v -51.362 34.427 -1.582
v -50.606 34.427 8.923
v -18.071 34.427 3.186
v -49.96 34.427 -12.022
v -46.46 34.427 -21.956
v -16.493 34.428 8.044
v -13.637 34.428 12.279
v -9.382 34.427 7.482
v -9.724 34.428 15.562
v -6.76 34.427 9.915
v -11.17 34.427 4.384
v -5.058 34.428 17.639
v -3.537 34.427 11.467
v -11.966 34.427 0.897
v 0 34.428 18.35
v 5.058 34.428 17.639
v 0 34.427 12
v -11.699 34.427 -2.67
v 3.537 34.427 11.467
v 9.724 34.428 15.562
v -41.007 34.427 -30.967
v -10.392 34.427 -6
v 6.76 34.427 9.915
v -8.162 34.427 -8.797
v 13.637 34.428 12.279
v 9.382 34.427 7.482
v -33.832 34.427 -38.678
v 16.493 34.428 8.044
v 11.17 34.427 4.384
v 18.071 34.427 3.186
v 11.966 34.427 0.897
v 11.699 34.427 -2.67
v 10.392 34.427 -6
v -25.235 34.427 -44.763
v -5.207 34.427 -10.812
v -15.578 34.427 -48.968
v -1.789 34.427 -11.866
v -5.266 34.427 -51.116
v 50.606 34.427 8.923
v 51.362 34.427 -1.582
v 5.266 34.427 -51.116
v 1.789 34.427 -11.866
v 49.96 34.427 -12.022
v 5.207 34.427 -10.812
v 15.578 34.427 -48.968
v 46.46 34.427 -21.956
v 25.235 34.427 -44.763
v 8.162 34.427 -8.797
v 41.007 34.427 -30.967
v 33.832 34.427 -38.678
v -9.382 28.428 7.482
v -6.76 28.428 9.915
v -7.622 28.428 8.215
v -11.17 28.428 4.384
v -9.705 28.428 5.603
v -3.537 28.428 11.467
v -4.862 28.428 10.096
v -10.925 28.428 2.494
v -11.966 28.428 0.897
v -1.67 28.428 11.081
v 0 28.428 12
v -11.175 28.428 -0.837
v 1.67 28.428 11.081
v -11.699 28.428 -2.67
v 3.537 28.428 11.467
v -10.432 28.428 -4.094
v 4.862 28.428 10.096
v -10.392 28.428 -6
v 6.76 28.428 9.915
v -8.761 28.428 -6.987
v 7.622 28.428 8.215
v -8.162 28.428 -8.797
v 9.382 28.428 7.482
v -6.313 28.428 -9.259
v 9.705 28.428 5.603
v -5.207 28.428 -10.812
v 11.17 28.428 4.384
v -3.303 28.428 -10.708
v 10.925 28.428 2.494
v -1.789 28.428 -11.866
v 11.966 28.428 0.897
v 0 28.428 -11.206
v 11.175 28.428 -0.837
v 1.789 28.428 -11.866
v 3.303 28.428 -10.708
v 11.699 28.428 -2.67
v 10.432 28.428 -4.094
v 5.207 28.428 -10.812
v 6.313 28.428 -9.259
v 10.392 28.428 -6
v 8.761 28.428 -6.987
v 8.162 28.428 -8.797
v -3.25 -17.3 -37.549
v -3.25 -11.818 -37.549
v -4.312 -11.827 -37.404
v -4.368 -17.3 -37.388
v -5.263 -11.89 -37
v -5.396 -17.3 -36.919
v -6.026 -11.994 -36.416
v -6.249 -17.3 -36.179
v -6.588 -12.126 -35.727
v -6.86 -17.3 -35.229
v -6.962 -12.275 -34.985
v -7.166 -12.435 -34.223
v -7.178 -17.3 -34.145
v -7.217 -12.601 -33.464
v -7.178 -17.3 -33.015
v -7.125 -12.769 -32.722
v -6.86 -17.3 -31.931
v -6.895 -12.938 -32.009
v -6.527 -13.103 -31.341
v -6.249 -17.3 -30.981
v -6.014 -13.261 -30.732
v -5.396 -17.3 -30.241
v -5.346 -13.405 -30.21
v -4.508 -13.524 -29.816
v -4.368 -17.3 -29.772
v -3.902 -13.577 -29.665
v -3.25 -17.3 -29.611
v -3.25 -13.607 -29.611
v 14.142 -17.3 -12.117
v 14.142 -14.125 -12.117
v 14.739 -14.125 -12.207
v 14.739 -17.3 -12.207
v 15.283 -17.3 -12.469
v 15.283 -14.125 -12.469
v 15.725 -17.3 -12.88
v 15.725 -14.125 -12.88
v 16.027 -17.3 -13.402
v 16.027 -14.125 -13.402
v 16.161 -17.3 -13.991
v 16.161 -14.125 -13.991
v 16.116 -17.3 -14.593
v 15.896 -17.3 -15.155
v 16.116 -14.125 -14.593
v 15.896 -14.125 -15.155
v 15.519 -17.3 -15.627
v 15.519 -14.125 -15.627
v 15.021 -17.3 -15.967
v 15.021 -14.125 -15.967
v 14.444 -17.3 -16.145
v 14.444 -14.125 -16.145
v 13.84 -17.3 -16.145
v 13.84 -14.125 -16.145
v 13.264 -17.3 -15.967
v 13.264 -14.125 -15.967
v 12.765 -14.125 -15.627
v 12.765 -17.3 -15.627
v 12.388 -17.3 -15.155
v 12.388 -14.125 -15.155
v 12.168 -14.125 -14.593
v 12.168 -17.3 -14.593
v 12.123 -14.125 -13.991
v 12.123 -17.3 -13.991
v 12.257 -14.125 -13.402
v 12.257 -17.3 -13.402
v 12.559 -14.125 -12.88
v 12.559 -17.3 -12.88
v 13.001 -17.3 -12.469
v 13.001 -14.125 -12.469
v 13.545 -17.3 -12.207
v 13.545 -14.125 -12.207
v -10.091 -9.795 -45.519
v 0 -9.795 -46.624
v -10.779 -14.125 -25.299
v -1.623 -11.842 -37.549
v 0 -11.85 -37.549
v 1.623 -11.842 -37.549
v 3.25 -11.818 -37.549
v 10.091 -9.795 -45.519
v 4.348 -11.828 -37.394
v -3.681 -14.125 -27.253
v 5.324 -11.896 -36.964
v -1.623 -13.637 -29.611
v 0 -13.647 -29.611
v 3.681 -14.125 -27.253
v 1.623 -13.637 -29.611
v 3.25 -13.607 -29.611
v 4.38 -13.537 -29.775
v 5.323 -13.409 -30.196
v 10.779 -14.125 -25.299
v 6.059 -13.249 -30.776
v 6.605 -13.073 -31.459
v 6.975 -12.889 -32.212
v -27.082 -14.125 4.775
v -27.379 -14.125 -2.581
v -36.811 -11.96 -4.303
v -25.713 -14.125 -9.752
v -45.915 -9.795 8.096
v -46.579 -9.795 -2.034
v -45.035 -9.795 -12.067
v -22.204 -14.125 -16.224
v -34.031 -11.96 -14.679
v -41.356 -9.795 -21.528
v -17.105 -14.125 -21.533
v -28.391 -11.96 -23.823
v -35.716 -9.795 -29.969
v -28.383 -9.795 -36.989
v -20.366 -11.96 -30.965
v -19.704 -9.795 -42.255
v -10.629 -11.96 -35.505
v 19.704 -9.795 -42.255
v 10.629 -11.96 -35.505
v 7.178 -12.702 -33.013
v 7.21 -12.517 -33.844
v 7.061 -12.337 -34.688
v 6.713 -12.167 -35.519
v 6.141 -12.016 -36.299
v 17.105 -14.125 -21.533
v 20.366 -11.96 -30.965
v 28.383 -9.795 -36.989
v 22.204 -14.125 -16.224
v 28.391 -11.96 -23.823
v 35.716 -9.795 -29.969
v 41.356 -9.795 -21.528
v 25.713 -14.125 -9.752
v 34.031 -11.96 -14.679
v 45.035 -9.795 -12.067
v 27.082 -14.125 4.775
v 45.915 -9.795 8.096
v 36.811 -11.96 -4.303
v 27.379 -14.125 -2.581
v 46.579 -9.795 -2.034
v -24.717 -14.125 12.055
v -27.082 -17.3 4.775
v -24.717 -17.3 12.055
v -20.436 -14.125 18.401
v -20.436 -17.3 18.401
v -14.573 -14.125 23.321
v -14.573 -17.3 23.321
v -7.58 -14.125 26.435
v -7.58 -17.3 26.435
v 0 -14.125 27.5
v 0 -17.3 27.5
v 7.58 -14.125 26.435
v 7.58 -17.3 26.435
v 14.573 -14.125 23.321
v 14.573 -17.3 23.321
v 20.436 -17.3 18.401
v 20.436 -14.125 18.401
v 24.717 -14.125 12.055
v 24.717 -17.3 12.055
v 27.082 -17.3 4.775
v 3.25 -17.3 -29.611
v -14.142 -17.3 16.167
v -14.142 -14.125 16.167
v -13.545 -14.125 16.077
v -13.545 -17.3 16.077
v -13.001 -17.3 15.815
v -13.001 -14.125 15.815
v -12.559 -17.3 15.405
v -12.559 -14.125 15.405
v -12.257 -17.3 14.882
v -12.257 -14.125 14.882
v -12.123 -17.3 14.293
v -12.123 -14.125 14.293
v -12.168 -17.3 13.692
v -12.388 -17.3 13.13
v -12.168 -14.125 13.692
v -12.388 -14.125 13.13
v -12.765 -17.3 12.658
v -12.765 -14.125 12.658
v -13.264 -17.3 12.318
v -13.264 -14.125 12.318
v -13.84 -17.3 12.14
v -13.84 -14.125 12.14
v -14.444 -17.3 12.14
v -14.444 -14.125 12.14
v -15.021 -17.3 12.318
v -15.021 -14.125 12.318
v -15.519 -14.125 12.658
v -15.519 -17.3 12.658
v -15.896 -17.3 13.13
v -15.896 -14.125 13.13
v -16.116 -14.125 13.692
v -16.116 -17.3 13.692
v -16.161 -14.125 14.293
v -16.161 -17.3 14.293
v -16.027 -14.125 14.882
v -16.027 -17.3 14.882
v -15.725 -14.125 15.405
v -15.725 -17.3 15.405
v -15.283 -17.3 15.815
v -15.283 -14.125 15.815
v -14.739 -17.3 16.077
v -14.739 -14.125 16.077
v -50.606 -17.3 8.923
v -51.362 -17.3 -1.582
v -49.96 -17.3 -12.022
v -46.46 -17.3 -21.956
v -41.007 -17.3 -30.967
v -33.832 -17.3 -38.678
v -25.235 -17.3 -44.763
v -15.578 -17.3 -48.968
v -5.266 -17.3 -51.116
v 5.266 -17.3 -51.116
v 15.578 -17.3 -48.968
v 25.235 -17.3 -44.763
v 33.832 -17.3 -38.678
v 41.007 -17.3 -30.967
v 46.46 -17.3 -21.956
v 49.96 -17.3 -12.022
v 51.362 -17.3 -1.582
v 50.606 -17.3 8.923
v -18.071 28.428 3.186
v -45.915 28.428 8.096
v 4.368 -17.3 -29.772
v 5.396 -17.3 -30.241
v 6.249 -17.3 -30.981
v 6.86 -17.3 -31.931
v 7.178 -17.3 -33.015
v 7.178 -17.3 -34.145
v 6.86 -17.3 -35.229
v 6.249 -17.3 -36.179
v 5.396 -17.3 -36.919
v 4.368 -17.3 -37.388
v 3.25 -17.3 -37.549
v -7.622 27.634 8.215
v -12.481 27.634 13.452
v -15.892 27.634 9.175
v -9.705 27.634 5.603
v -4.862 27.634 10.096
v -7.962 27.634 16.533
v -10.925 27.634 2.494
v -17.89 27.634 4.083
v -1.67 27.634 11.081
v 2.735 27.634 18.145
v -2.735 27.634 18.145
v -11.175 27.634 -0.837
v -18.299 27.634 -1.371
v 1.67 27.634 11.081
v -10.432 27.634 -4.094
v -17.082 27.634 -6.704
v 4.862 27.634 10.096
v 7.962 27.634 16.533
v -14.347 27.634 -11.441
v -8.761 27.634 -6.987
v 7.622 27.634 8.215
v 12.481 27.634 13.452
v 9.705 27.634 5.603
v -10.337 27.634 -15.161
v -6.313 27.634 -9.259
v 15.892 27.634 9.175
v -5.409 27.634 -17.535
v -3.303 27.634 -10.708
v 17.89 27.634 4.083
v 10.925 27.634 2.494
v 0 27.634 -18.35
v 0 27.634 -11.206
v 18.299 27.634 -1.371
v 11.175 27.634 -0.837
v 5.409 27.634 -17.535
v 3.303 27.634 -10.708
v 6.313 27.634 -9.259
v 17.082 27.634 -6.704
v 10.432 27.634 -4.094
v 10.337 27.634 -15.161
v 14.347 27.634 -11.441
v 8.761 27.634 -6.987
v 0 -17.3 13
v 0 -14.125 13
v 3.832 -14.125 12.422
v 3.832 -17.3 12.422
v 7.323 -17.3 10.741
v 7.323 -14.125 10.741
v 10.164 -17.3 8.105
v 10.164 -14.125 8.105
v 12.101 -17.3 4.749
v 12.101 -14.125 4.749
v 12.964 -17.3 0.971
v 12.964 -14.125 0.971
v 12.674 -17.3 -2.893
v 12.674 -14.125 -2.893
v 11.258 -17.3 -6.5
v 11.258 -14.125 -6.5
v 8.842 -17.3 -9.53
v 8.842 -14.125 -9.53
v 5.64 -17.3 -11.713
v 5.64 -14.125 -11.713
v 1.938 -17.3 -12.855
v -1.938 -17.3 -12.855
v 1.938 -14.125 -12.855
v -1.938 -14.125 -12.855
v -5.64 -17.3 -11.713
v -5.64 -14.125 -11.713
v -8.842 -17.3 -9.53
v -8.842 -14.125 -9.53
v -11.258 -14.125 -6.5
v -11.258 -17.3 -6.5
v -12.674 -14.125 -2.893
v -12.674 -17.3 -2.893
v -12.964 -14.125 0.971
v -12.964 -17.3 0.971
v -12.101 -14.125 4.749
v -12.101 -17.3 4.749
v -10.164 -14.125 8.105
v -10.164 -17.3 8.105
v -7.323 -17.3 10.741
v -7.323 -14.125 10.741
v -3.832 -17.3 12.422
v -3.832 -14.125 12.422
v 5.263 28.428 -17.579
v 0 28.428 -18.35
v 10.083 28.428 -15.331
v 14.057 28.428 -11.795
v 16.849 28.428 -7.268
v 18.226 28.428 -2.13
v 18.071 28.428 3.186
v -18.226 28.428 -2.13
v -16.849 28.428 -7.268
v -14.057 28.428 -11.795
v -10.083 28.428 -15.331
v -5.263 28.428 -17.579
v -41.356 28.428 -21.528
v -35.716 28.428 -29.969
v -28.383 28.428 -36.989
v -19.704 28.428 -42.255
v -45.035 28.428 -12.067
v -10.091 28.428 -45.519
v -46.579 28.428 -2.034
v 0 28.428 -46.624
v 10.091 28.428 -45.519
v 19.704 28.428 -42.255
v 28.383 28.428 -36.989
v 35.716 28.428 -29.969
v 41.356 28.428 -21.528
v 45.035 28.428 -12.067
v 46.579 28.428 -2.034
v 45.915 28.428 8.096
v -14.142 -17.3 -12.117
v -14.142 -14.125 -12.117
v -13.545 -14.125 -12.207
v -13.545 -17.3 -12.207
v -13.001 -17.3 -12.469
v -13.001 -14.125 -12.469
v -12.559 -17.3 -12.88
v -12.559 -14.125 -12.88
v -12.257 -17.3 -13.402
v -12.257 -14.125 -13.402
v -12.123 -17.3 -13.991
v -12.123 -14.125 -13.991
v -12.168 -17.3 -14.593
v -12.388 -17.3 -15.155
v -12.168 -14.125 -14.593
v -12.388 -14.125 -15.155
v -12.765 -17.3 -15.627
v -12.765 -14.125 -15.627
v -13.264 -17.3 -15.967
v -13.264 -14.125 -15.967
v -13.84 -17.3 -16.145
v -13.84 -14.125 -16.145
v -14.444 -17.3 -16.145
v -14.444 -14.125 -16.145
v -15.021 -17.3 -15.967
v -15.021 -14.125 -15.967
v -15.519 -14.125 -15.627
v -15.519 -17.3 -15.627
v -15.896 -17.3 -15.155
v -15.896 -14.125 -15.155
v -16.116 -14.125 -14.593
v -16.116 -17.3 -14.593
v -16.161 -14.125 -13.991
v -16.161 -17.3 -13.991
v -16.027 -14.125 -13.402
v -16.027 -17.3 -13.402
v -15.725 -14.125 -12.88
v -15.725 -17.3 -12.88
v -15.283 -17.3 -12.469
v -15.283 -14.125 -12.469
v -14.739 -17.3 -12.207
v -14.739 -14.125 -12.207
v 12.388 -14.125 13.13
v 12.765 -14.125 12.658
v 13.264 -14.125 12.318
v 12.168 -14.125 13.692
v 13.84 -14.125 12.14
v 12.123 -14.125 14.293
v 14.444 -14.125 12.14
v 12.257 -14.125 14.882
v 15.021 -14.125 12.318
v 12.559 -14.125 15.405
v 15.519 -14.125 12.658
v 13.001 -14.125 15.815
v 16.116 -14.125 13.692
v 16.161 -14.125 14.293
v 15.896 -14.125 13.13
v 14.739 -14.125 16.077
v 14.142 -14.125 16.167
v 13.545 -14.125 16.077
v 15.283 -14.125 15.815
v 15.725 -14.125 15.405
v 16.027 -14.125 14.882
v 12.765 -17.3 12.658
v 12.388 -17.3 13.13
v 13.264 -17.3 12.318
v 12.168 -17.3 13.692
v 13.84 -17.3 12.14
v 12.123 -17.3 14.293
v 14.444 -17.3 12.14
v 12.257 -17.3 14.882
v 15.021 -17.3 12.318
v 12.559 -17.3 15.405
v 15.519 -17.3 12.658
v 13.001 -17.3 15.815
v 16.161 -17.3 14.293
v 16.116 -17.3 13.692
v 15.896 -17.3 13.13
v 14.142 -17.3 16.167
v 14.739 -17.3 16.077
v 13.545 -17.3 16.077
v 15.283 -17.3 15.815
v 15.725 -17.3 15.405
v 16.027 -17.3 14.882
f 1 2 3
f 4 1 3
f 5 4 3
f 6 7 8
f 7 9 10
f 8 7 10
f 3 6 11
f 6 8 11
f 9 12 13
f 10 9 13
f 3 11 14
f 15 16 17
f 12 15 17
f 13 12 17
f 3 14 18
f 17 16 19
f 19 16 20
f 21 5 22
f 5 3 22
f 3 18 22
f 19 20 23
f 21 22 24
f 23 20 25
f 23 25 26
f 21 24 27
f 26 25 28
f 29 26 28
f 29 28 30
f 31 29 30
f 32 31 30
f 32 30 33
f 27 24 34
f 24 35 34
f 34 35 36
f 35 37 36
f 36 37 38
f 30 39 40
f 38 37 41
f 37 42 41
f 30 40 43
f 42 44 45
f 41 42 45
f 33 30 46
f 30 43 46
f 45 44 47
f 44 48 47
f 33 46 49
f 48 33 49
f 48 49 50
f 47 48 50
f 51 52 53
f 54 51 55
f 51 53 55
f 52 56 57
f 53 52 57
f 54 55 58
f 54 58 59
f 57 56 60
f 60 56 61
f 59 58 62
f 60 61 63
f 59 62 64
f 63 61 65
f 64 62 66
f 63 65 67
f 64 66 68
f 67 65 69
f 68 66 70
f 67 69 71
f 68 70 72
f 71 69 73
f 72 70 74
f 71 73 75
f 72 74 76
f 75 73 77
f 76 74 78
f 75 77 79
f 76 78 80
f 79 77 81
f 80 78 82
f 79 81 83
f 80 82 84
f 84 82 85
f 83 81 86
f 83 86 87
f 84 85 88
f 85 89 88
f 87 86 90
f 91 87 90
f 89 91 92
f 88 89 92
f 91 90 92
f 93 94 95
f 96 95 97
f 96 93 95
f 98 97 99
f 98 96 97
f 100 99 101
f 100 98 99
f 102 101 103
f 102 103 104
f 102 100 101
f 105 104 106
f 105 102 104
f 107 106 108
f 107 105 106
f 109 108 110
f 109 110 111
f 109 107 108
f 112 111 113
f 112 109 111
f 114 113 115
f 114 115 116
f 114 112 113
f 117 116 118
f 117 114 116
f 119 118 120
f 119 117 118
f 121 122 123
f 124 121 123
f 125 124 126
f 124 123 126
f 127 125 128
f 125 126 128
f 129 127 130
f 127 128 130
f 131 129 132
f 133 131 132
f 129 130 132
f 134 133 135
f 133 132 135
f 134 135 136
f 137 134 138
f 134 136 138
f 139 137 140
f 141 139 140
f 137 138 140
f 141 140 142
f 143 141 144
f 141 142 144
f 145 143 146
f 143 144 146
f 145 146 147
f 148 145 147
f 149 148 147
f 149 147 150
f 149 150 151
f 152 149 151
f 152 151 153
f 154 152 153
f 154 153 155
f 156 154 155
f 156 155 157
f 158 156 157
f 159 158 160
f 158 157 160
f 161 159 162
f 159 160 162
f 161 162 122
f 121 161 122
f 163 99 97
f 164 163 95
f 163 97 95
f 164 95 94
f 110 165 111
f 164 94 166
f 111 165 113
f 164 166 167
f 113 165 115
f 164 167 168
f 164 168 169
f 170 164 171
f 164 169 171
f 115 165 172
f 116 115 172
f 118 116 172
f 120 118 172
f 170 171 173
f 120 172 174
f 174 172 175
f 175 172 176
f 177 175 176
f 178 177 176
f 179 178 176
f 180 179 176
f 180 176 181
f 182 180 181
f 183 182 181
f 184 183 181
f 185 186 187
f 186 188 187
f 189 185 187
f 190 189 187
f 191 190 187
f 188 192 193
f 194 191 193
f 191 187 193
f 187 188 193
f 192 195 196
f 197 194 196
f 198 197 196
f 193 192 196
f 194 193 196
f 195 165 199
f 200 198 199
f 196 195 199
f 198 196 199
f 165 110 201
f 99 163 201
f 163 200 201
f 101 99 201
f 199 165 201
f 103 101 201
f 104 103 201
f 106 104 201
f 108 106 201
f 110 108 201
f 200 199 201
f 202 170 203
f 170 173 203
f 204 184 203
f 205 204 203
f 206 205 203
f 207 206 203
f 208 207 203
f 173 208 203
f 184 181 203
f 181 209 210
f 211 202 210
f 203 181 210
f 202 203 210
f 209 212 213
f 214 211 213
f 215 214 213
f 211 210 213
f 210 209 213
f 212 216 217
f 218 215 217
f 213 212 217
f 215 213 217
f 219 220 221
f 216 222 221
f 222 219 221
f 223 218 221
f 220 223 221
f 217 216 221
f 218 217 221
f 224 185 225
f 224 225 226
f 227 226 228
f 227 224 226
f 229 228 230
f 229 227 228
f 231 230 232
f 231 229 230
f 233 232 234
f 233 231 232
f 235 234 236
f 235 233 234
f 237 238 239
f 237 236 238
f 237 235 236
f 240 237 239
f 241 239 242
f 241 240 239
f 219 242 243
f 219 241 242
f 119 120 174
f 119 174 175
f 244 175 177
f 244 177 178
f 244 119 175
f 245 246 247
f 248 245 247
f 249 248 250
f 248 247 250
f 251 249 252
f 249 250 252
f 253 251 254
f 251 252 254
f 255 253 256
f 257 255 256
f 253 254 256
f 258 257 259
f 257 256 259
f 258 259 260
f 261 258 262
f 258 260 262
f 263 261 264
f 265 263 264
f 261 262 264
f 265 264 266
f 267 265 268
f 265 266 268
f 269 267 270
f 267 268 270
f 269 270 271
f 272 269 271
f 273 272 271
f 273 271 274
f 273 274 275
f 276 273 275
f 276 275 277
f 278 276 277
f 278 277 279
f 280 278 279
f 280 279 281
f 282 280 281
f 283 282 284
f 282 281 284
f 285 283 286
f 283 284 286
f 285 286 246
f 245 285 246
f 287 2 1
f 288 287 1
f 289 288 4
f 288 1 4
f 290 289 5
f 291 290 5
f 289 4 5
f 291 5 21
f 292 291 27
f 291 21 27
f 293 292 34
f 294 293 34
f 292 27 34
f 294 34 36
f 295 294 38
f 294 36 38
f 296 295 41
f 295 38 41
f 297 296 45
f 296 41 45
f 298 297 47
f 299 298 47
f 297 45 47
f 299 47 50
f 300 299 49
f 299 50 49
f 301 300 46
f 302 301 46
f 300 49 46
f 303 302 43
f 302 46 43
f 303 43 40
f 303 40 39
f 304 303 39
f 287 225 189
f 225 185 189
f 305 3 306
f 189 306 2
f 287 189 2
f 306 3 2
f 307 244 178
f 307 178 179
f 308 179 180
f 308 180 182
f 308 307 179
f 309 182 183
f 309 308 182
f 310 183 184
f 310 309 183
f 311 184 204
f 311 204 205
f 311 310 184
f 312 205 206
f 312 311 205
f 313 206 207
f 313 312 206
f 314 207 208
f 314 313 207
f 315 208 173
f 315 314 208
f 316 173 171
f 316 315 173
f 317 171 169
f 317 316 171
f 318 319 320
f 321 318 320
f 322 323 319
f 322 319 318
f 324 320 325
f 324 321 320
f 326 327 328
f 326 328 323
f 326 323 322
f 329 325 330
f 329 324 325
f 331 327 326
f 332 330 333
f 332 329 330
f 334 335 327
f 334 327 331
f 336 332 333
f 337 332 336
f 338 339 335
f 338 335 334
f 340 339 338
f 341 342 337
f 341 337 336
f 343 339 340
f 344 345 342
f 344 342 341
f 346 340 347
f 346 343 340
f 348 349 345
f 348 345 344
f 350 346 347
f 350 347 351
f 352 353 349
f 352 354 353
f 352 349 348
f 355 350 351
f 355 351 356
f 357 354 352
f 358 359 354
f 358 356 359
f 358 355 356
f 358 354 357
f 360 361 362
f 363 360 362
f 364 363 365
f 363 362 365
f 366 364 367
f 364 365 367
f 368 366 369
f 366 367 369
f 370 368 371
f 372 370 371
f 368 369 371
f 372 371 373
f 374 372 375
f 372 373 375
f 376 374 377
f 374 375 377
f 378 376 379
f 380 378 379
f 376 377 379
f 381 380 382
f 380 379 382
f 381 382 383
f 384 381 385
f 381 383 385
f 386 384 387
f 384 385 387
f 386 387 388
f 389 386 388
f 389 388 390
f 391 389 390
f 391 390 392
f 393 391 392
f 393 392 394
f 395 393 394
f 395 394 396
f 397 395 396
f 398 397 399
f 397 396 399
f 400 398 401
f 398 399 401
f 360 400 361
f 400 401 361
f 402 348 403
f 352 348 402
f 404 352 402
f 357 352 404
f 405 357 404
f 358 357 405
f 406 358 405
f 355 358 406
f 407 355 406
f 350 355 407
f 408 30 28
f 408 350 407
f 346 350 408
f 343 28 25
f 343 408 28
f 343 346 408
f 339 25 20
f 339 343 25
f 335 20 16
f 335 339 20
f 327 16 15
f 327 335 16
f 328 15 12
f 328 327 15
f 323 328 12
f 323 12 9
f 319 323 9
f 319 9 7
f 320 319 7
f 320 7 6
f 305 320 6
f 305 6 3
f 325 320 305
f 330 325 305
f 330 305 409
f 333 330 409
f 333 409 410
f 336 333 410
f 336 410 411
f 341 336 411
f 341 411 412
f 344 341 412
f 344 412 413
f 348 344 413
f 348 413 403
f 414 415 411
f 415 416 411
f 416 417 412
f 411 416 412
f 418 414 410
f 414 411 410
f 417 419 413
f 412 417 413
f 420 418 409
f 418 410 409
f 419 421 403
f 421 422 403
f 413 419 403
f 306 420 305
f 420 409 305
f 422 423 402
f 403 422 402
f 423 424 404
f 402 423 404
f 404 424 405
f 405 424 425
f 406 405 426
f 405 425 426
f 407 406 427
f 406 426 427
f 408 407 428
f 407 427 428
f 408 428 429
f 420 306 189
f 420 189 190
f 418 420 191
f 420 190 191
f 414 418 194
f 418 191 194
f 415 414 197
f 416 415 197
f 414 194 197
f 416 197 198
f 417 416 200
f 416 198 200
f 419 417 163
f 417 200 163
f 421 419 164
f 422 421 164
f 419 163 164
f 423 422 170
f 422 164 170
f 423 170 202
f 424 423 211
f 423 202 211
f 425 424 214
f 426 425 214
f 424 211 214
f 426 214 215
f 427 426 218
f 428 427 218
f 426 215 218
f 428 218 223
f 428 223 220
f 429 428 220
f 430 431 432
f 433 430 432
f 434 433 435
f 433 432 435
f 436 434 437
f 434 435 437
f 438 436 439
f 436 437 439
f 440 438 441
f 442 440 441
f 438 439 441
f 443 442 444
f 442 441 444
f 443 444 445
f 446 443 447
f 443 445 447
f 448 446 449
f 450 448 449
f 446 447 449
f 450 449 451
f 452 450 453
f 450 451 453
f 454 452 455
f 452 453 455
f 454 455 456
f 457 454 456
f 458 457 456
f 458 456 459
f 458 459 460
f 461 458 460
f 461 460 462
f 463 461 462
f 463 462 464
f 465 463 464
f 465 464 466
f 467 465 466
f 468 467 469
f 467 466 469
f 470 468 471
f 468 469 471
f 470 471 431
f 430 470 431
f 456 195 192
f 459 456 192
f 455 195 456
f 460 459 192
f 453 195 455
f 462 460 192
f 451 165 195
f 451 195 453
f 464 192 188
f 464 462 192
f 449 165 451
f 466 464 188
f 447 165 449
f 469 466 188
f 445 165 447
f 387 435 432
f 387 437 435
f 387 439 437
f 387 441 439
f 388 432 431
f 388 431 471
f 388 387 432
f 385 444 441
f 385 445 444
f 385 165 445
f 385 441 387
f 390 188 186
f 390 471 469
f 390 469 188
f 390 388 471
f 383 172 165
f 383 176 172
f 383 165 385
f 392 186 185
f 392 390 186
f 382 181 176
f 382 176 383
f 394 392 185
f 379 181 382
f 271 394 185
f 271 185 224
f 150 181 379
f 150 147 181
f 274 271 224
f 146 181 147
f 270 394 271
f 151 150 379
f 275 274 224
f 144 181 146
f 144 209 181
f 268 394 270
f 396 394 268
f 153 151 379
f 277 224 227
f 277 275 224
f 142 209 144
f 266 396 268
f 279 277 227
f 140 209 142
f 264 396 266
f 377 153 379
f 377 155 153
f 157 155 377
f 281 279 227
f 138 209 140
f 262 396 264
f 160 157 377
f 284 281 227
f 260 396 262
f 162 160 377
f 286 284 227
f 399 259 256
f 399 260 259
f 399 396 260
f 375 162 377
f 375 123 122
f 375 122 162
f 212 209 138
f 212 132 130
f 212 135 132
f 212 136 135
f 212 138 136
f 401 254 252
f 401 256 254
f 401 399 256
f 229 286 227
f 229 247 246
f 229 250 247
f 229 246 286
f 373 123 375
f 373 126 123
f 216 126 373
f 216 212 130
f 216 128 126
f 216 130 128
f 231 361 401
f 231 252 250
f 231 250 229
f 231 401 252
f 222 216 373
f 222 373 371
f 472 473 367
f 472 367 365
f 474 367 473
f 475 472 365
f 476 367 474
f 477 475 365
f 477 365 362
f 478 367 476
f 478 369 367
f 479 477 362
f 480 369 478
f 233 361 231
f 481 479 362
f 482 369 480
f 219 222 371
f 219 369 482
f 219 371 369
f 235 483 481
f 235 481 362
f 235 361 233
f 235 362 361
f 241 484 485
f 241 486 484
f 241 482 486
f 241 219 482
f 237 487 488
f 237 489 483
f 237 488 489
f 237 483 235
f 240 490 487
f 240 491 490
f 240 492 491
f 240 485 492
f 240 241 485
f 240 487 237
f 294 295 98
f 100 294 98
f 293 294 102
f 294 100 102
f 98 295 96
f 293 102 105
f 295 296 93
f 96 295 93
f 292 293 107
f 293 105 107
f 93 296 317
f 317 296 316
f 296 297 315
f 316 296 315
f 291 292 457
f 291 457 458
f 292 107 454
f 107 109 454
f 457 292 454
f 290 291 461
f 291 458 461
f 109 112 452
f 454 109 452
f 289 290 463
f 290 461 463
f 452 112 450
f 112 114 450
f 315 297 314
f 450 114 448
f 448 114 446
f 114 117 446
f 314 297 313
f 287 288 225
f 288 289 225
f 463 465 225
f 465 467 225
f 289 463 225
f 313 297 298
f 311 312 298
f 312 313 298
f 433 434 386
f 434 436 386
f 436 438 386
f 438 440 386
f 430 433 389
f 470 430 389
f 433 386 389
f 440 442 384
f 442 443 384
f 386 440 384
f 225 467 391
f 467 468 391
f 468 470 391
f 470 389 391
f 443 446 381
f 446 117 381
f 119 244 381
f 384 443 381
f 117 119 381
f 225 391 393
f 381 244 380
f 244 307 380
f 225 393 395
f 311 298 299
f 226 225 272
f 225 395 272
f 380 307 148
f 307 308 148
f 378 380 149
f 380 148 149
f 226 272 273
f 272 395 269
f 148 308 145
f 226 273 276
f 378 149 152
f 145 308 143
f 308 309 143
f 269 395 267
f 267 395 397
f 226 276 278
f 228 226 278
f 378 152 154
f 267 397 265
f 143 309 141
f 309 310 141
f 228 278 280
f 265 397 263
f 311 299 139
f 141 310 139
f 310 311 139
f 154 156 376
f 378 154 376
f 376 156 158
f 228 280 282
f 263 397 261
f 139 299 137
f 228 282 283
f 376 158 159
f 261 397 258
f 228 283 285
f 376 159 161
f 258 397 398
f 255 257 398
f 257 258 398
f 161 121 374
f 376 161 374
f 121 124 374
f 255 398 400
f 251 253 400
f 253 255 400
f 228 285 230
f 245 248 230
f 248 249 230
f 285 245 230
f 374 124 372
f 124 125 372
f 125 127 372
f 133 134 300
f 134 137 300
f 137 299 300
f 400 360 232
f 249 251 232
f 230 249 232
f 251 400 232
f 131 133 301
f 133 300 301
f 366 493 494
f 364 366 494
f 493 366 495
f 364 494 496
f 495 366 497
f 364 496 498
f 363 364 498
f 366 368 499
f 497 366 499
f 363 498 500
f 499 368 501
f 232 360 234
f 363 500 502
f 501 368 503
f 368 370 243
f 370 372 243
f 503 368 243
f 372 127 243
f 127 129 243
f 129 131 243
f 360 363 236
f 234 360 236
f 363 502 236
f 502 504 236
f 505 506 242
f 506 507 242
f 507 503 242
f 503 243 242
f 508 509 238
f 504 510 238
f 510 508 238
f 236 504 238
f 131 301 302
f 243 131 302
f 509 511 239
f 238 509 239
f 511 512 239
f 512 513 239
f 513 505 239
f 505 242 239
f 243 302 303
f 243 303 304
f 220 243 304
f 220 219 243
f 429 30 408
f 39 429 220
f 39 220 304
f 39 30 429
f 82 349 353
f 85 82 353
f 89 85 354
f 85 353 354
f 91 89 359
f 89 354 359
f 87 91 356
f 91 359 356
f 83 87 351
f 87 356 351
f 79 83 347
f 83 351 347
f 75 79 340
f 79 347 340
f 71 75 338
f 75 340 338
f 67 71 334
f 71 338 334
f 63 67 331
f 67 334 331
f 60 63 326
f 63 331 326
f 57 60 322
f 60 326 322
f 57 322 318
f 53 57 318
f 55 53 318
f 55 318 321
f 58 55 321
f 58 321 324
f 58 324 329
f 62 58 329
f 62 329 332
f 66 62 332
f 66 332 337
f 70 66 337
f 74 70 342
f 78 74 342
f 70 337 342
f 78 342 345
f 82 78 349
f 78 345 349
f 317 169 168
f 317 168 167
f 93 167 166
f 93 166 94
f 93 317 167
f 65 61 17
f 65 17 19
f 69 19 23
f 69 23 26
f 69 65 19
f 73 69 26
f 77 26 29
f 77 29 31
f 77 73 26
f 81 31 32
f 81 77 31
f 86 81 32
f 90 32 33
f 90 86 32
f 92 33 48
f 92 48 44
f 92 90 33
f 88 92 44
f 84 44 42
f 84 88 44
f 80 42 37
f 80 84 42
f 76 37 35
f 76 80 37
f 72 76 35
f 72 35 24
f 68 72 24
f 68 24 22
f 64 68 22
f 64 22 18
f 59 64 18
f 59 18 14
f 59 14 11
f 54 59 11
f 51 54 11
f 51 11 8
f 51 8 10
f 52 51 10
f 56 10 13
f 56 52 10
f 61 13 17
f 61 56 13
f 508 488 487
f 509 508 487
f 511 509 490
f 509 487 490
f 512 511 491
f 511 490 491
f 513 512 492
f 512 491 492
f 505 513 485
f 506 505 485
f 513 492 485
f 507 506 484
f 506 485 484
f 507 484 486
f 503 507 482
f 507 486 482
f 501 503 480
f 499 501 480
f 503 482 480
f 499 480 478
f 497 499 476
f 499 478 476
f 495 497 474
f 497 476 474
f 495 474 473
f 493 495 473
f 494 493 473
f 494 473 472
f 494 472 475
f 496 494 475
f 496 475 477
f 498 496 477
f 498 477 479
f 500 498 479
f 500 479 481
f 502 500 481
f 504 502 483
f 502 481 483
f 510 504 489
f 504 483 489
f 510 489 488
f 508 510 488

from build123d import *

# Parameters (mm, degrees)
BOSS_EXTRUDE1_START = -14.125
SKETCH2_R           = 27.5
SKETCH2_R_2         = 13.000000035
SKETCH2_R_3         = 2.025
BOSS_EXTRUDE1_DEPTH = 3.175
BOSS_EXTRUDE2_START = 28.4275
SKETCH3_R           = 18.35
SKETCH3_R_2         = 12
BOSS_EXTRUDE2_DEPTH = 6
REVOLVE1_ANGLE      = 200
BOSS_EXTRUDE3_START = 0.79375
SKETCH5_R           = 18.35
SKETCH5_R_2         = 11.20625
BOSS_EXTRUDE3_DEPTH = 0.79375
CUT_EXTRUDE1_REACH  = 91.201


with BuildPart() as part:
    # Sketch2 → Boss-Extrude1 (new body)
    with BuildSketch(Plane(origin=(0, 0, 0), x_dir=(1, 0, 0), z_dir=(0, 1, 0)).offset(BOSS_EXTRUDE1_START)):
        with Locations(Location((0, 0, 0), (0, 0, 270))):
            Circle(SKETCH2_R)
        with Locations(Location((0, 0, 0), (0, 0, 270))):
            Circle(SKETCH2_R_2, mode=Mode.SUBTRACT)
        with Locations(Location((-14.142135624, -14.142135624, 0), (0, 0, 270))):
            Circle(SKETCH2_R_3, mode=Mode.SUBTRACT)
        with Locations(Location((14.142135624, -14.142135624, 0), (0, 0, 270))):
            Circle(SKETCH2_R_3, mode=Mode.SUBTRACT)
        with Locations(Location((14.142135624, 14.142135624, 0), (0, 0, 270))):
            Circle(SKETCH2_R_3, mode=Mode.SUBTRACT)
        with Locations(Location((-14.142135624, 14.142135624, 0), (0, 0, 270))):
            Circle(SKETCH2_R_3, mode=Mode.SUBTRACT)
    extrude(amount=-BOSS_EXTRUDE1_DEPTH)



with BuildPart() as body_2:
    # Sketch3 → Boss-Extrude2 (new body)
    with BuildSketch(Plane(origin=(0, 0, 0), x_dir=(1, 0, 0), z_dir=(0, 1, 0)).offset(BOSS_EXTRUDE2_START)):
        with Locations(Location((0, 0, 0), (0, 0, 270))):
            Circle(SKETCH3_R)
        with Locations(Location((0, 0, 0), (0, 0, 270))):
            Circle(SKETCH3_R_2, mode=Mode.SUBTRACT)
    extrude(amount=BOSS_EXTRUDE2_DEPTH)


with BuildPart() as part_1:
    add(part.part)

    add(body_2.part)  # Revolve1 merges body 2
    # Sketch4 → Revolve1 (revolve, symmetric)
    with BuildSketch(Plane(origin=(0, 0, 0), x_dir=(0, 0, -1), z_dir=(1, 0, 0))) as revolve1_sk:
        Polygon((27.5, -17.3), (51.38625, -17.3), (51.38625, 34.42749997), (18.35, 34.42749997), (18.35, 28.427500017), (46.62375, 28.427500017), (46.62375, -9.795291189), (27.5, -14.125), align=None)
    revolve(axis=Axis((0, -14.125, 0), (0, 1, 0)), revolution_arc=REVOLVE1_ANGLE / 2)
    revolve(revolve1_sk.sketch, axis=Axis((0, -14.125, 0), (0, -1, 0)), revolution_arc=REVOLVE1_ANGLE / 2)

    # Sketch5 → Boss-Extrude3 (add)
    with BuildSketch(Plane.XZ.offset(-28.427500017).offset(BOSS_EXTRUDE3_START)):
        with Locations(Location((0, 0, 0), (0, 0, 270))):
            Circle(SKETCH5_R)
        with Locations(Location((0, 0, 0), (0, 0, 270))):
            Circle(SKETCH5_R_2, mode=Mode.SUBTRACT)
    extrude(amount=-BOSS_EXTRUDE3_DEPTH)

    # Cut-Extrude1: up to this cone (the profile starts outside it)
    cut_extrude1_end = Plane(origin=(0, -17.3, 0), z_dir=(0, 1, 0)).offset(-3.051131024) * Cone(4.417e-06, 478.031284628, 108.228576807, align=(Align.CENTER, Align.CENTER, Align.MIN), mode=Mode.PRIVATE)
    # Sketch6 → Cut-Extrude1 (cut, up to the surface)
    with BuildSketch(Plane(origin=(0, -17.3, 0), x_dir=(-1, 0, 0), z_dir=(0, -1, 0)), mode=Mode.PRIVATE) as cut_extrude1_sk1:
        with BuildLine():
            Line((3.25, 29.61125), (-3.25, 29.61125))
            ThreePointArc((-3.25, 29.61125), (-7.21875, 33.58), (-3.25, 37.54875))
            Line((-3.25, 37.54875), (3.25, 37.54875))
            ThreePointArc((3.25, 37.54875), (7.21875, 33.58), (3.25, 29.61125))
        make_face()
    cut_extrude1_tool1 = extrude(cut_extrude1_sk1.sketch, amount=-CUT_EXTRUDE1_REACH, mode=Mode.PRIVATE) - cut_extrude1_end
    add(cut_extrude1_tool1.solids().sort_by_distance((0, -17.3, -33.58))[0], mode=Mode.SUBTRACT)


solid = part_1.part
